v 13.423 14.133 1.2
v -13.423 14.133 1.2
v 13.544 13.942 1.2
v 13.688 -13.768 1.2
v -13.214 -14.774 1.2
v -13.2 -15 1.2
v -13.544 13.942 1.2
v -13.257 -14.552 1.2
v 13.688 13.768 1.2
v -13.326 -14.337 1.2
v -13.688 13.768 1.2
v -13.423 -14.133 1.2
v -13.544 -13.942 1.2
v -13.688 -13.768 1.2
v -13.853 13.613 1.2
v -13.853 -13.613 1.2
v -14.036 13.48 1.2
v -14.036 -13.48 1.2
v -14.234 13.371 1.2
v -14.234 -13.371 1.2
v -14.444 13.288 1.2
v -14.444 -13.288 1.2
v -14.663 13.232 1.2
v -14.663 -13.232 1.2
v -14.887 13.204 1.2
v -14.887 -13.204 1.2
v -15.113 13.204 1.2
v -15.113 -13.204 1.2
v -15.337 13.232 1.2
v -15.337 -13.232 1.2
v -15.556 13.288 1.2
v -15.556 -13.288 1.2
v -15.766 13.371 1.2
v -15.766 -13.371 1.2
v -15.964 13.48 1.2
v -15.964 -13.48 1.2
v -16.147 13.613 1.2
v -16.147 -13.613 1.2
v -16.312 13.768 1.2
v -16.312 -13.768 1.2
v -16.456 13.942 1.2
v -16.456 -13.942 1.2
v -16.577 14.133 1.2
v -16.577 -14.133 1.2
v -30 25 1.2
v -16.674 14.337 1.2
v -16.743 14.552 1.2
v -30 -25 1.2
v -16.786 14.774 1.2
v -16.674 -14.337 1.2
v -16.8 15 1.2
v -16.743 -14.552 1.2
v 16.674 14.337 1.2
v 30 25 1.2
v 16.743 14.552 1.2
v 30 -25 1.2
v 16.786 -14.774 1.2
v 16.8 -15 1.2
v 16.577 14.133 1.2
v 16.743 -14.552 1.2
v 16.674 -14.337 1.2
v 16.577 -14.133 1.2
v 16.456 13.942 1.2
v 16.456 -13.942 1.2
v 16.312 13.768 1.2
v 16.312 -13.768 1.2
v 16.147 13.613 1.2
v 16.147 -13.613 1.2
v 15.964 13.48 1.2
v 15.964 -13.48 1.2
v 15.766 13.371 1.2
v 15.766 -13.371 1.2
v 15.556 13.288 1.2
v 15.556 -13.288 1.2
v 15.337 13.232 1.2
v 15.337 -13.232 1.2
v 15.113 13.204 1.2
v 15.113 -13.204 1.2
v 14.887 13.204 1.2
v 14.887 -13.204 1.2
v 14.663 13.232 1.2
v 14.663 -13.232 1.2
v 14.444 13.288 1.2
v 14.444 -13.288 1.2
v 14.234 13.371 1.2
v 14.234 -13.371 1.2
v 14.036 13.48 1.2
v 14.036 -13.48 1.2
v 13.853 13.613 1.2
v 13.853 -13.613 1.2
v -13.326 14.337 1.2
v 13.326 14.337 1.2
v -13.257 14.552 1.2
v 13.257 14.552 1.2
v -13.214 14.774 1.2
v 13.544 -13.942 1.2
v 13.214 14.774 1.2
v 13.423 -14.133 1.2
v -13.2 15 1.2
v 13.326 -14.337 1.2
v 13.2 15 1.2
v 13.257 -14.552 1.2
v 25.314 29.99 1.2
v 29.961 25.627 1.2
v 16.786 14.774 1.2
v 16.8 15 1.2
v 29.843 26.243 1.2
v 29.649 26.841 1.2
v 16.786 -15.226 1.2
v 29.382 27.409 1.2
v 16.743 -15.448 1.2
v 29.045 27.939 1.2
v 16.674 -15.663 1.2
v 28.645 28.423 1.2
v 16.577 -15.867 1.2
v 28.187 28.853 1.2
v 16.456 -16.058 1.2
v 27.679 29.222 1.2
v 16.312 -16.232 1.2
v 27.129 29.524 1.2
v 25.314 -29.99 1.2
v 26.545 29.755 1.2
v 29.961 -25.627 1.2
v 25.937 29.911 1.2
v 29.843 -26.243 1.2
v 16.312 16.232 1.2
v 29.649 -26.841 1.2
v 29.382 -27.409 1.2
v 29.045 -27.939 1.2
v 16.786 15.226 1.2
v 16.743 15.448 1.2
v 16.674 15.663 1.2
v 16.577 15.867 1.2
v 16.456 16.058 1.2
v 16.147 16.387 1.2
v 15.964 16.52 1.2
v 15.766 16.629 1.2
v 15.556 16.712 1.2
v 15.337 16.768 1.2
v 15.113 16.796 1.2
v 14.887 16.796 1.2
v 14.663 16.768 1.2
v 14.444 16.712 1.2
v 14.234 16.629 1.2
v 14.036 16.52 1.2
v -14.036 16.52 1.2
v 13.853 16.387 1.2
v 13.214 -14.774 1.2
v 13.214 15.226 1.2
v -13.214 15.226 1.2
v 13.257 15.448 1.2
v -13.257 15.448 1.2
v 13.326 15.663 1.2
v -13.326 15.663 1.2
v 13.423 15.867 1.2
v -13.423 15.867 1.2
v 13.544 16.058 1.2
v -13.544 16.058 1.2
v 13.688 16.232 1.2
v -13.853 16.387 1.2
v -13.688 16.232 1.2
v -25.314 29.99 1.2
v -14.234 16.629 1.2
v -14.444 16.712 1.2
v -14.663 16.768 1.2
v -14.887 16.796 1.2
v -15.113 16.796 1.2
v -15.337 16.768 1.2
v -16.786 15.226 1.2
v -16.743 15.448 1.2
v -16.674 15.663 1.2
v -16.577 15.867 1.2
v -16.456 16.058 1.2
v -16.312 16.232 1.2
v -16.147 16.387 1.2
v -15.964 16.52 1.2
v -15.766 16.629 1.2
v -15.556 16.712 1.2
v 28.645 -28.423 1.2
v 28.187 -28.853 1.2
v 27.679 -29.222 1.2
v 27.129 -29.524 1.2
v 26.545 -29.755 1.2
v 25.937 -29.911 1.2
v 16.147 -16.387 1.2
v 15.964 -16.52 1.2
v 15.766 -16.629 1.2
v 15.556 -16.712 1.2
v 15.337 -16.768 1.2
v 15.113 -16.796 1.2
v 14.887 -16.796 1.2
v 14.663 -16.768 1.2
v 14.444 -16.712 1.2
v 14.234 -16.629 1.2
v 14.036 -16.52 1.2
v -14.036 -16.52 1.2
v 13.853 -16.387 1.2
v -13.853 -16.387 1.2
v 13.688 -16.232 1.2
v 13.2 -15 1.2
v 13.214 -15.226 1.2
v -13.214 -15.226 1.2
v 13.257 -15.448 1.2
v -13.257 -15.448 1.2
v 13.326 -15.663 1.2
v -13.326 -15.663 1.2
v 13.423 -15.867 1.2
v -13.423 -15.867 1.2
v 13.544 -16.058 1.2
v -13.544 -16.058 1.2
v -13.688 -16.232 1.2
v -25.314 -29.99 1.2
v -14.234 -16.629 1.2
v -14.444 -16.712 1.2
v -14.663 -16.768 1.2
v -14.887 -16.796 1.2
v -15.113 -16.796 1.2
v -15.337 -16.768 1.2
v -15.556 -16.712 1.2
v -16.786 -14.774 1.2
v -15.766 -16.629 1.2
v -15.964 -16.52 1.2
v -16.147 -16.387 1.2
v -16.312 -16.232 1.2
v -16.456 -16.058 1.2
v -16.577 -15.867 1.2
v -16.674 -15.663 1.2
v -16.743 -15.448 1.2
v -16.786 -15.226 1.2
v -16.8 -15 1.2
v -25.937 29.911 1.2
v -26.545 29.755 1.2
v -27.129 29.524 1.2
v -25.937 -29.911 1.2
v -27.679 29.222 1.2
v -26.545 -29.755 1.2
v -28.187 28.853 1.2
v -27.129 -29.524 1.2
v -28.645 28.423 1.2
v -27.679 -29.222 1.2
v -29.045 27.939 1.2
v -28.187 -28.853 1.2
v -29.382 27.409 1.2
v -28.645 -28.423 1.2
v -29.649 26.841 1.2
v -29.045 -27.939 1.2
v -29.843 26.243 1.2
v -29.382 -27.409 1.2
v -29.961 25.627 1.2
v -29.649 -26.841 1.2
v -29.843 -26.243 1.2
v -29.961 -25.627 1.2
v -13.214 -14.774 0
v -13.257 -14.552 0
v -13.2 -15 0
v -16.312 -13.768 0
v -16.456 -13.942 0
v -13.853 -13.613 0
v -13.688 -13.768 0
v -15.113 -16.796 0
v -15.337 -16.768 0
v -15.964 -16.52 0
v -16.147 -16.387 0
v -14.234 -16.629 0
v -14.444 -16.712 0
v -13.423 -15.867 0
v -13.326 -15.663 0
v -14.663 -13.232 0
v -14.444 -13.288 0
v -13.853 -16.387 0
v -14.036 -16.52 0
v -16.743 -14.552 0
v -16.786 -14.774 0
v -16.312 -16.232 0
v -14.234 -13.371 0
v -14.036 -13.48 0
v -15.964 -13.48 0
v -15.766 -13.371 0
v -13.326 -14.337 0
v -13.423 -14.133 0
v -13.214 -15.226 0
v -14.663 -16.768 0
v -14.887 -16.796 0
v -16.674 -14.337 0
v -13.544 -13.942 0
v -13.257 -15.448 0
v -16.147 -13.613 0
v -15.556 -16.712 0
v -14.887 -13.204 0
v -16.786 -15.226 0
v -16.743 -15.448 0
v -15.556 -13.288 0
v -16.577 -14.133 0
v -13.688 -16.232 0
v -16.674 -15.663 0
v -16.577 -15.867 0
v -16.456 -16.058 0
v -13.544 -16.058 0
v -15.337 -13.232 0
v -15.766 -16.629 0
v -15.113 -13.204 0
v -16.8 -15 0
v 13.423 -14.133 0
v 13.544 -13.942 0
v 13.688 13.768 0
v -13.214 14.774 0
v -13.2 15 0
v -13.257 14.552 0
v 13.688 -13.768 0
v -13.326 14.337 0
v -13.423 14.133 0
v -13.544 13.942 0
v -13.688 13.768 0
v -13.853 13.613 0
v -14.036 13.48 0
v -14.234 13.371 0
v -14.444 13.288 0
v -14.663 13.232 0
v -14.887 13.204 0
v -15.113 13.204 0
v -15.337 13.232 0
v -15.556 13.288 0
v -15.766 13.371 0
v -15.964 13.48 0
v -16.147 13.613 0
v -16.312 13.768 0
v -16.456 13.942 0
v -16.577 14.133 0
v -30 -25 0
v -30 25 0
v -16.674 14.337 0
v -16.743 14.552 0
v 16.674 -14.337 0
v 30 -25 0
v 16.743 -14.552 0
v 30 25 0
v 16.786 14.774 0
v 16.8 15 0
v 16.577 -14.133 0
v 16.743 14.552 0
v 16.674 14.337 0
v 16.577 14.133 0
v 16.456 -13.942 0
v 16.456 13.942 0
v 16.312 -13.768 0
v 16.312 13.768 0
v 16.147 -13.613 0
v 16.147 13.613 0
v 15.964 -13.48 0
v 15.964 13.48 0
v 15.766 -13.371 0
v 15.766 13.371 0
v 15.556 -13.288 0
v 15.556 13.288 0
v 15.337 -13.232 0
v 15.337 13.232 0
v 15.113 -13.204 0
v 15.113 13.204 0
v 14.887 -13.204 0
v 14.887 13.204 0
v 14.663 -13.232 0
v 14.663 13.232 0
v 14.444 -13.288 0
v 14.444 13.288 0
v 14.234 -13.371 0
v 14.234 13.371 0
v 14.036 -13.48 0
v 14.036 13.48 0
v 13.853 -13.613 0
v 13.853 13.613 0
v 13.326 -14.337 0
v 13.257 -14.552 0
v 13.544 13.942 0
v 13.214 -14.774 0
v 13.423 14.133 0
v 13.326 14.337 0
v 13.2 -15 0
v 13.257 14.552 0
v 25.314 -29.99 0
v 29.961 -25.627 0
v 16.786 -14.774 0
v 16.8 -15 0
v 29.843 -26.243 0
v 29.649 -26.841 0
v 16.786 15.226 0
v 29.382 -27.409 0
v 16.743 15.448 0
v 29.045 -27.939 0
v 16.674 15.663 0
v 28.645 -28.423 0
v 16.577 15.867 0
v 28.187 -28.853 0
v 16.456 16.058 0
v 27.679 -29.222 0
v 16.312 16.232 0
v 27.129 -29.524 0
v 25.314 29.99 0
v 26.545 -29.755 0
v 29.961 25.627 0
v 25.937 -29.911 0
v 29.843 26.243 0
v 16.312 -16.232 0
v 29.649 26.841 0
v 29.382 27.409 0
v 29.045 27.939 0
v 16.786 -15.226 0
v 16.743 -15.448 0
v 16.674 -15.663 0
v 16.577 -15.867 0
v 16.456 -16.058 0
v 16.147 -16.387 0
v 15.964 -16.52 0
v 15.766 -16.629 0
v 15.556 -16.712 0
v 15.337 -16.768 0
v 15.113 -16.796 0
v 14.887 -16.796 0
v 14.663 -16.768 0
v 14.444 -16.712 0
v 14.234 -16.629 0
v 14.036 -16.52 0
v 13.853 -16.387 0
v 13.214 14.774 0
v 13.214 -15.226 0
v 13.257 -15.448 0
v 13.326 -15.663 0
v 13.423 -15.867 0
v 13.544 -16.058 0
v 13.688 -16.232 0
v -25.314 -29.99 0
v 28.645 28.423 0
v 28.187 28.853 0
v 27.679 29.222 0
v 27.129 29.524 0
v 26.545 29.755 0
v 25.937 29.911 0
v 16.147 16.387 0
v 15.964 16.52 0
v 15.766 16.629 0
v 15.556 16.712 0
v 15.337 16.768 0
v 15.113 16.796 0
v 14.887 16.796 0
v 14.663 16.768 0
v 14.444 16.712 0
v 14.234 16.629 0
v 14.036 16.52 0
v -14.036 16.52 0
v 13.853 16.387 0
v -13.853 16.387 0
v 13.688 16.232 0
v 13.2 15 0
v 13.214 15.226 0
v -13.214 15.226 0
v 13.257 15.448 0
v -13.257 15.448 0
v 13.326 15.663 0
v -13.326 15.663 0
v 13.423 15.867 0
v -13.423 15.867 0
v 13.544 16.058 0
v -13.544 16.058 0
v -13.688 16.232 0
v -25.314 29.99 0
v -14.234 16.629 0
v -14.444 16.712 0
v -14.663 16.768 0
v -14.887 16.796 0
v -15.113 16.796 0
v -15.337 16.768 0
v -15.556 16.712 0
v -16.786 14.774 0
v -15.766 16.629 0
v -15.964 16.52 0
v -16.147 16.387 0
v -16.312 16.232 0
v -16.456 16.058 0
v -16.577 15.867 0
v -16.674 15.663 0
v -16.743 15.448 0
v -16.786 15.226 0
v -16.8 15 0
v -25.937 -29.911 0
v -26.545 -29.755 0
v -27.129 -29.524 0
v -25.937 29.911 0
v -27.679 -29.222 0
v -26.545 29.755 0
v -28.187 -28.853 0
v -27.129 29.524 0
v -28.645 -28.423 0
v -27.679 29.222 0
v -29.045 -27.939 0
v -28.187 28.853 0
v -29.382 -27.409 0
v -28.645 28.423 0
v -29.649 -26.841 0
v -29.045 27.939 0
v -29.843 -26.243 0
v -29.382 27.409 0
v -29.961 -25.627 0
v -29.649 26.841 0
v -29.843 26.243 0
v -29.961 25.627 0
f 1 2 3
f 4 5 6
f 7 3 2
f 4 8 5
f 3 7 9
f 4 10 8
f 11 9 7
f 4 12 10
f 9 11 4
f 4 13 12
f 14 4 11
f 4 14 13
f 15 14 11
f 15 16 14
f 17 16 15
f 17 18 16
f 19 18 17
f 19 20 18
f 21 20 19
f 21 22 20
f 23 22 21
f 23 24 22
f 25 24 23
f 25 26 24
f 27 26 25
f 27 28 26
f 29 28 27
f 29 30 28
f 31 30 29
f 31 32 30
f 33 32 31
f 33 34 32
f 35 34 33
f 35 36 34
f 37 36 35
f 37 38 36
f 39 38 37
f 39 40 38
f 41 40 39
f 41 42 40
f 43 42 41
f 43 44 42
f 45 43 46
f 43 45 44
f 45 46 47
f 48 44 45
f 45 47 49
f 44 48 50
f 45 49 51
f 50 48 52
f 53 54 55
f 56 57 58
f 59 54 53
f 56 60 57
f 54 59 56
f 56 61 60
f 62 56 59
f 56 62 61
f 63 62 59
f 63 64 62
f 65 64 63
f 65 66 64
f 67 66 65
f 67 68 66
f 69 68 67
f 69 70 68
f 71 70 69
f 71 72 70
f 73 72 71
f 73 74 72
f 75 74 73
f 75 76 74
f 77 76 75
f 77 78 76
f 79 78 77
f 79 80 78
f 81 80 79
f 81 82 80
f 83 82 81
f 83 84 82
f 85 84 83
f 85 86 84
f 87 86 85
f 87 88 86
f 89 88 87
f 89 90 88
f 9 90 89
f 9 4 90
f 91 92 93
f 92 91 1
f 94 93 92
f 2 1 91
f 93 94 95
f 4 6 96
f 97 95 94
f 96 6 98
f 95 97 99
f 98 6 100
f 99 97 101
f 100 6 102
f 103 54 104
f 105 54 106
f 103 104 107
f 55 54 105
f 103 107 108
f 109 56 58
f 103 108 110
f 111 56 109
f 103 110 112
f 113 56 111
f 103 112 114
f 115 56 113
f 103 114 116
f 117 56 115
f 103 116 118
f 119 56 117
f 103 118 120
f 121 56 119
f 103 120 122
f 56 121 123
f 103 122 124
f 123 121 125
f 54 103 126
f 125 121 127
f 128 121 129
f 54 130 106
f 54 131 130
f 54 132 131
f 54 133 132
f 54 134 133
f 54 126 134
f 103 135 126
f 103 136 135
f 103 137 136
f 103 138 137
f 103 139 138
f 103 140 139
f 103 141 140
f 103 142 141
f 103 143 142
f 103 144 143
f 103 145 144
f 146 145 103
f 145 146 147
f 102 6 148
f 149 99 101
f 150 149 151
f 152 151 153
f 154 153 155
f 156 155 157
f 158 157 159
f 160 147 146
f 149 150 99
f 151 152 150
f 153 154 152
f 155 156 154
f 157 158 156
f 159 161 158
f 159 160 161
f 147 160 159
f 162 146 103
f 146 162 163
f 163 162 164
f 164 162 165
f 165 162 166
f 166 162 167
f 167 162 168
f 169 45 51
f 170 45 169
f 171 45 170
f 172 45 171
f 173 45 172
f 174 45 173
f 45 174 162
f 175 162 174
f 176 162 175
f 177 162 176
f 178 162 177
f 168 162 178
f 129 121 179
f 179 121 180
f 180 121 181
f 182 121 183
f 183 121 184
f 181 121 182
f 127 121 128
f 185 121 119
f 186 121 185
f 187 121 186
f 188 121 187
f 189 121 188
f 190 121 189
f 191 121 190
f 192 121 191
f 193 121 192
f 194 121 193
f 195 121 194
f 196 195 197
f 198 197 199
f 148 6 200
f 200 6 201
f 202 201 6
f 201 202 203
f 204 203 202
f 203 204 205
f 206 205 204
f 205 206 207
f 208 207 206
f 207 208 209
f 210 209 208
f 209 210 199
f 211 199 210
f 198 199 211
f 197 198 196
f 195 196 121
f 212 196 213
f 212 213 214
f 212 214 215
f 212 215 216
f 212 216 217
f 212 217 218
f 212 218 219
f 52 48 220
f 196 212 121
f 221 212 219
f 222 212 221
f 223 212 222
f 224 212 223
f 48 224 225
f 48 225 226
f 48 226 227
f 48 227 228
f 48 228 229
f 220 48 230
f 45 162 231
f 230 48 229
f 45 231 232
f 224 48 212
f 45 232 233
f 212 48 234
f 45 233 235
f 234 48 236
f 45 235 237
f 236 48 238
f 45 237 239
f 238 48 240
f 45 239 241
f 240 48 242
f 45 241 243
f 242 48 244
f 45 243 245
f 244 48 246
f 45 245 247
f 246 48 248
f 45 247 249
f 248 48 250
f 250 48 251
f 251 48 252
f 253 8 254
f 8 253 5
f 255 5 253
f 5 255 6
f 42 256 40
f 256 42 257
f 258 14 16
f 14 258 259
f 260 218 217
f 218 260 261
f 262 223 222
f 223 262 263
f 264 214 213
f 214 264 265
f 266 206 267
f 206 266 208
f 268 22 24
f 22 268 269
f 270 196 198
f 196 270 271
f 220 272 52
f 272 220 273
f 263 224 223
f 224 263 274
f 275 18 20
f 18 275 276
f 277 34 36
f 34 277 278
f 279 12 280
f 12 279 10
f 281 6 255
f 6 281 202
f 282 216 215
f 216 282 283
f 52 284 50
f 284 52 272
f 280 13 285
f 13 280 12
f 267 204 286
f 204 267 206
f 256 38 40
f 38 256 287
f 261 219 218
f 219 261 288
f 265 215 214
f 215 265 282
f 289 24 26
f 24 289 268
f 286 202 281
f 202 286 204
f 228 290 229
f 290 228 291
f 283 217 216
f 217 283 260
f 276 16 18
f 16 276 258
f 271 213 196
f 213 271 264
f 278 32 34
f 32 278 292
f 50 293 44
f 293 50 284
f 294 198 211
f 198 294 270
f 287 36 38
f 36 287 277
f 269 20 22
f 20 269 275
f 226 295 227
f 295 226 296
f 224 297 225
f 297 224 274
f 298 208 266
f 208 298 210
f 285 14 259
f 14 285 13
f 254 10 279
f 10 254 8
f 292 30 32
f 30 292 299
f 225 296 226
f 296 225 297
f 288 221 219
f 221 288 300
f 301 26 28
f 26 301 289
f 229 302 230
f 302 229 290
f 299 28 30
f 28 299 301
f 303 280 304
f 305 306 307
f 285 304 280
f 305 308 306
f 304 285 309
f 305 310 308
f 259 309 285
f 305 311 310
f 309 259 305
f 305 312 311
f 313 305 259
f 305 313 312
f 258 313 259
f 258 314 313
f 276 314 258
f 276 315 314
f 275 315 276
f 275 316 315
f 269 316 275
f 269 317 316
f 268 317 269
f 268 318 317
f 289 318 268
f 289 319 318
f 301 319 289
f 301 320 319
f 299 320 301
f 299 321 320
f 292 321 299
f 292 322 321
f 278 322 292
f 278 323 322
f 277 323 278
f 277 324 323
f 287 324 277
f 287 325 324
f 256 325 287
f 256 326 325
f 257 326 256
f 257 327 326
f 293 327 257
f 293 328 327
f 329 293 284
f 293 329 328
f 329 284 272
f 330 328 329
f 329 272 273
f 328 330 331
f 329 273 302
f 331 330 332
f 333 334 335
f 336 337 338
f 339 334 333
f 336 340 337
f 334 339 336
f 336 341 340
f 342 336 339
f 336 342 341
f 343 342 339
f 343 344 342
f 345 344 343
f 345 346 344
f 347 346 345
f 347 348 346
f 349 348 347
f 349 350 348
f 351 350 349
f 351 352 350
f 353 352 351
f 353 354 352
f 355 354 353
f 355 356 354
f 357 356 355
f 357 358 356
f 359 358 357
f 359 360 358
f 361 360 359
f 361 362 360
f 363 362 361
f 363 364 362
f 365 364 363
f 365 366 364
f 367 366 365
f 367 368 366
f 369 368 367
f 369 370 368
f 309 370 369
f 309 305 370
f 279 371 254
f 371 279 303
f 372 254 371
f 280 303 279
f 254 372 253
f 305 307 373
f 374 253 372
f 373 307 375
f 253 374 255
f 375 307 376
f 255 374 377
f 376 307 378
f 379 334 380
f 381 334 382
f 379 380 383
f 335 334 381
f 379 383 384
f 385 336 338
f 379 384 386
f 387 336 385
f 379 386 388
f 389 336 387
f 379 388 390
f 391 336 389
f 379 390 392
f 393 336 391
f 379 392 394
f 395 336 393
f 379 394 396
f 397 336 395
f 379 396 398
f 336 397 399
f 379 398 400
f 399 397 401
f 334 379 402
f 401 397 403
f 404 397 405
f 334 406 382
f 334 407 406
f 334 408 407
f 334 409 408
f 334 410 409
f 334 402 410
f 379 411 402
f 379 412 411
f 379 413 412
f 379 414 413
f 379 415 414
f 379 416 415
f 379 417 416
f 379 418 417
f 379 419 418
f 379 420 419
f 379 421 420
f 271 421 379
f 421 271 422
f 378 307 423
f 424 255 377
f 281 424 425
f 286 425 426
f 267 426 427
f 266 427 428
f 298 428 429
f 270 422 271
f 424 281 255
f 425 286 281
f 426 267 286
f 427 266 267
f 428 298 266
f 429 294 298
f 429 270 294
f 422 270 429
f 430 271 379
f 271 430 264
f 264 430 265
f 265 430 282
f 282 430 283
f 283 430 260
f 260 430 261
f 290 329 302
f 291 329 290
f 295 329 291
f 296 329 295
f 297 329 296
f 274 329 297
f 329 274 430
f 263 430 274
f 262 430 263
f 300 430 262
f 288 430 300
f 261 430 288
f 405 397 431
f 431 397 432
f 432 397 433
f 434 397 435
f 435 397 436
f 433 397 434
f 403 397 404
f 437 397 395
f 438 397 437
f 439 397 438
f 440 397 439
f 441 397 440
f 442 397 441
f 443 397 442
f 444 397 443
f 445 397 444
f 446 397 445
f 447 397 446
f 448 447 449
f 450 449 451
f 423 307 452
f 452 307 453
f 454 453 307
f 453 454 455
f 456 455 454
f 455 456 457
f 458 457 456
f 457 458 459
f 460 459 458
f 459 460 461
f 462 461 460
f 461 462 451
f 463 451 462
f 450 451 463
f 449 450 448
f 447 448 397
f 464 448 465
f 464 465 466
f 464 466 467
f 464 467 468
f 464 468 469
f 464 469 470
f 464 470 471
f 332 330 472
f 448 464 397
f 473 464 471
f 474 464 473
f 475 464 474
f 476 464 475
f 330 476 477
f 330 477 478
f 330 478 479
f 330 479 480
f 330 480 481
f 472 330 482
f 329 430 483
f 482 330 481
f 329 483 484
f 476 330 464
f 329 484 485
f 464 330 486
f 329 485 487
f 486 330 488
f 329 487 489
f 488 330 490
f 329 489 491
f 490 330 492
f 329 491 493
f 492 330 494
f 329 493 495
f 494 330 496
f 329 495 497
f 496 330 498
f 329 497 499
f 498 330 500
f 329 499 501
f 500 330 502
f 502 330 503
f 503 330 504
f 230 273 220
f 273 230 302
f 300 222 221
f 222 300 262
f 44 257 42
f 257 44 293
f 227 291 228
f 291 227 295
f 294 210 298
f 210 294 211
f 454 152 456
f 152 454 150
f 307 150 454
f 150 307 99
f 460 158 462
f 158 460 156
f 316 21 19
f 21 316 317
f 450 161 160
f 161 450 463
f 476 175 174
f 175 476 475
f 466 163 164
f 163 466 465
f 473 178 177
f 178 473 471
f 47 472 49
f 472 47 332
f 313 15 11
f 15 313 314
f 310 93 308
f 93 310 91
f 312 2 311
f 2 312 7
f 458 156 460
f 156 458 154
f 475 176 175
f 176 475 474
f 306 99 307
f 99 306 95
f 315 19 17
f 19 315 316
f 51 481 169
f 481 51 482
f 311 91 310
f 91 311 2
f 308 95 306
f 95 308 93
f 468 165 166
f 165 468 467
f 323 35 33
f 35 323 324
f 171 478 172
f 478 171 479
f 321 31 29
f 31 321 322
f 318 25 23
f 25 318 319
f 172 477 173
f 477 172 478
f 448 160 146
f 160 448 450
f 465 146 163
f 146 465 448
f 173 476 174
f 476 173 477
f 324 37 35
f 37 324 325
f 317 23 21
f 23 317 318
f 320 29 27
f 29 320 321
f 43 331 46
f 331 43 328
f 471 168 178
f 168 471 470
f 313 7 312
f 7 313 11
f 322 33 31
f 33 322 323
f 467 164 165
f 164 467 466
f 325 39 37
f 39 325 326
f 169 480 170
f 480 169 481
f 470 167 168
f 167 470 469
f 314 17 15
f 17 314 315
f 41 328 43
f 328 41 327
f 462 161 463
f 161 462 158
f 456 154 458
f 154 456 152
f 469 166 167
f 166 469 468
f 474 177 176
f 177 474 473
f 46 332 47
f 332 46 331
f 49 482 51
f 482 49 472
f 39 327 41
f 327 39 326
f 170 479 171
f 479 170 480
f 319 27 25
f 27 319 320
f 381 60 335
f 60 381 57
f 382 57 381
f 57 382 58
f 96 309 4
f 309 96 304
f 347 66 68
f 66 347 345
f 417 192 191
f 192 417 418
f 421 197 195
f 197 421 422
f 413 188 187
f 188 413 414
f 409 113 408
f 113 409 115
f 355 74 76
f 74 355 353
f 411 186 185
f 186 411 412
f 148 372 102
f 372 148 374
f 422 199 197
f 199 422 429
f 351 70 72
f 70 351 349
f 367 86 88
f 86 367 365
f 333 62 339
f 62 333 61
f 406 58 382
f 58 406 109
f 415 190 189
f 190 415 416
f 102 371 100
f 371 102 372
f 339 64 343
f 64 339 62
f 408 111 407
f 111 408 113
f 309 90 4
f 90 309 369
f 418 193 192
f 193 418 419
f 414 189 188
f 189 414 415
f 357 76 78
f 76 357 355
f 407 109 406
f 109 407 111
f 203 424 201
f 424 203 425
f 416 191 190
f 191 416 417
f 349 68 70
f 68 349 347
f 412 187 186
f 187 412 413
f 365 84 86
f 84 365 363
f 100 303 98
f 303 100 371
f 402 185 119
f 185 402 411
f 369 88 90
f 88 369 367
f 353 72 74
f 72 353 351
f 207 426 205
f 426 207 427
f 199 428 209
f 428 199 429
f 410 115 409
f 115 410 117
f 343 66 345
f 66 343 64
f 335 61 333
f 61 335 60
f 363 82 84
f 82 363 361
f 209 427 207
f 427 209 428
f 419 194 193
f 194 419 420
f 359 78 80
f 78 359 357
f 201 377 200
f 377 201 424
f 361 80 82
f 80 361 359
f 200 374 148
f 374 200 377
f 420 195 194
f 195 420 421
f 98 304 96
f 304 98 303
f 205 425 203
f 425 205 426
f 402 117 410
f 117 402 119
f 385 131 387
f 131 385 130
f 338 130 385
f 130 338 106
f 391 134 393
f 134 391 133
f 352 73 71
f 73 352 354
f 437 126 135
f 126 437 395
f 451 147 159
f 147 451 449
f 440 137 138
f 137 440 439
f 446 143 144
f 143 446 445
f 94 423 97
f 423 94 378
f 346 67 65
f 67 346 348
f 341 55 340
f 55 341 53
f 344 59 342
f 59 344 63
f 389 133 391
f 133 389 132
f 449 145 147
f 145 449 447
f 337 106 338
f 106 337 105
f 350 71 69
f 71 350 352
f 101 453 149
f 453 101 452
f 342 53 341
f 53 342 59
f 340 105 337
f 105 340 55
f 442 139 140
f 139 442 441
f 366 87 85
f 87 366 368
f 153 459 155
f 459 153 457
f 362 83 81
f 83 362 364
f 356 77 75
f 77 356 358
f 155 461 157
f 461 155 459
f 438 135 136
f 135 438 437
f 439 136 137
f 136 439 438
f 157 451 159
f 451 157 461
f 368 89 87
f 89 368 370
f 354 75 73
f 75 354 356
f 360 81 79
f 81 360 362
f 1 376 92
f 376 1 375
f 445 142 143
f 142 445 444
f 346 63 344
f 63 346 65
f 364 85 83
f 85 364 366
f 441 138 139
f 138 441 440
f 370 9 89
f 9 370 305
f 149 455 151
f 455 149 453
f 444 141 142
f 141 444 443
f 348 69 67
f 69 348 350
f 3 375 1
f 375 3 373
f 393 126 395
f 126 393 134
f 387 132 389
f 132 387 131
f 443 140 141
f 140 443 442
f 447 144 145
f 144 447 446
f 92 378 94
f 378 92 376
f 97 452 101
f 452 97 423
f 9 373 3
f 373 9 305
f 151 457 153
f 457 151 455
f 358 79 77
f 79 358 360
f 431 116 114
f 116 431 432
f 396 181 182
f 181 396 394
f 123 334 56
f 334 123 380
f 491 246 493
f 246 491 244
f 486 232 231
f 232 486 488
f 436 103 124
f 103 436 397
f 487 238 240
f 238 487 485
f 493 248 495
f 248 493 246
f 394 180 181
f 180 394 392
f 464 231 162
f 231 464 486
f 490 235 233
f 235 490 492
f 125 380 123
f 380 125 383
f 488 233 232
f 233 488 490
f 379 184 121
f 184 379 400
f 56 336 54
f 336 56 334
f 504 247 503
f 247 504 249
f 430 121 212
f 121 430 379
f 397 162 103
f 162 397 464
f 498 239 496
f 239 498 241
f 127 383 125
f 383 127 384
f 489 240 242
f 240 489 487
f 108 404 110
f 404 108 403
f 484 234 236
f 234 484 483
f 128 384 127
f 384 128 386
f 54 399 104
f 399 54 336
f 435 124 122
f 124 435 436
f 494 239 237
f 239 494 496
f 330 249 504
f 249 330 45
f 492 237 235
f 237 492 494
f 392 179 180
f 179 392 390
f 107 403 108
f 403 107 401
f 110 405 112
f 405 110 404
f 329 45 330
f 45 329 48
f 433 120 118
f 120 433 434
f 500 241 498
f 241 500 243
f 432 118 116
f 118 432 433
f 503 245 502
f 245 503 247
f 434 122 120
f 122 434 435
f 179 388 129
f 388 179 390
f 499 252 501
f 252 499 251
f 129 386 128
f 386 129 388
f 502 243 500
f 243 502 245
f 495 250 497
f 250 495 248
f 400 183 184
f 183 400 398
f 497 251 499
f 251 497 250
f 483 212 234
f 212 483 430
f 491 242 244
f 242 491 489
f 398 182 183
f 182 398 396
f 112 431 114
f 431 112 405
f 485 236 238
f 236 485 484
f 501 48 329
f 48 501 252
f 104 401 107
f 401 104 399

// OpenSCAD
$fn = 50;


difference() {
	union() {
		hull() {
			translate(v = [-25.0000000000, 25.0000000000, 0]) {
				cylinder(h = 9, r = 5);
			}
			translate(v = [25.0000000000, 25.0000000000, 0]) {
				cylinder(h = 9, r = 5);
			}
			translate(v = [-25.0000000000, -25.0000000000, 0]) {
				cylinder(h = 9, r = 5);
			}
			translate(v = [25.0000000000, -25.0000000000, 0]) {
				cylinder(h = 9, r = 5);
			}
		}
	}
	union() {
		translate(v = [0, 0, 1.2000000000]) {
			hull() {
				translate(v = [-25.0000000000, 25.0000000000, 0]) {
					cylinder(h = 7.8000000000, r = 3.8000000000);
				}
				translate(v = [25.0000000000, 25.0000000000, 0]) {
					cylinder(h = 7.8000000000, r = 3.8000000000);
				}
				translate(v = [-25.0000000000, -25.0000000000, 0]) {
					cylinder(h = 7.8000000000, r = 3.8000000000);
				}
				translate(v = [25.0000000000, -25.0000000000, 0]) {
					cylinder(h = 7.8000000000, r = 3.8000000000);
				}
			}
		}
		#translate(v = [-15.0000000000, -15.0000000000, 0]) {
			cylinder(h = 1.2000000000, r = 1.8000000000);
		}
		#translate(v = [-15.0000000000, 15.0000000000, 0]) {
			cylinder(h = 1.2000000000, r = 1.8000000000);
		}
		#translate(v = [15.0000000000, -15.0000000000, 0]) {
			cylinder(h = 1.2000000000, r = 1.8000000000);
		}
		#translate(v = [15.0000000000, 15.0000000000, 0]) {
			cylinder(h = 1.2000000000, r = 1.8000000000);
		}
		translate(v = [-250.0000000000, -250.0000000000, 1.2000000000]) {
			cube(size = [500, 500, 500]);
		}
		translate(v = [-250.0000000000, -250.0000000000, 1.2000000000]) {
			cube(size = [500, 500, 500]);
		}
		translate(v = [-250.0000000000, -250.0000000000, 1.2000000000]) {
			cube(size = [500, 500, 500]);
		}
	}
}
